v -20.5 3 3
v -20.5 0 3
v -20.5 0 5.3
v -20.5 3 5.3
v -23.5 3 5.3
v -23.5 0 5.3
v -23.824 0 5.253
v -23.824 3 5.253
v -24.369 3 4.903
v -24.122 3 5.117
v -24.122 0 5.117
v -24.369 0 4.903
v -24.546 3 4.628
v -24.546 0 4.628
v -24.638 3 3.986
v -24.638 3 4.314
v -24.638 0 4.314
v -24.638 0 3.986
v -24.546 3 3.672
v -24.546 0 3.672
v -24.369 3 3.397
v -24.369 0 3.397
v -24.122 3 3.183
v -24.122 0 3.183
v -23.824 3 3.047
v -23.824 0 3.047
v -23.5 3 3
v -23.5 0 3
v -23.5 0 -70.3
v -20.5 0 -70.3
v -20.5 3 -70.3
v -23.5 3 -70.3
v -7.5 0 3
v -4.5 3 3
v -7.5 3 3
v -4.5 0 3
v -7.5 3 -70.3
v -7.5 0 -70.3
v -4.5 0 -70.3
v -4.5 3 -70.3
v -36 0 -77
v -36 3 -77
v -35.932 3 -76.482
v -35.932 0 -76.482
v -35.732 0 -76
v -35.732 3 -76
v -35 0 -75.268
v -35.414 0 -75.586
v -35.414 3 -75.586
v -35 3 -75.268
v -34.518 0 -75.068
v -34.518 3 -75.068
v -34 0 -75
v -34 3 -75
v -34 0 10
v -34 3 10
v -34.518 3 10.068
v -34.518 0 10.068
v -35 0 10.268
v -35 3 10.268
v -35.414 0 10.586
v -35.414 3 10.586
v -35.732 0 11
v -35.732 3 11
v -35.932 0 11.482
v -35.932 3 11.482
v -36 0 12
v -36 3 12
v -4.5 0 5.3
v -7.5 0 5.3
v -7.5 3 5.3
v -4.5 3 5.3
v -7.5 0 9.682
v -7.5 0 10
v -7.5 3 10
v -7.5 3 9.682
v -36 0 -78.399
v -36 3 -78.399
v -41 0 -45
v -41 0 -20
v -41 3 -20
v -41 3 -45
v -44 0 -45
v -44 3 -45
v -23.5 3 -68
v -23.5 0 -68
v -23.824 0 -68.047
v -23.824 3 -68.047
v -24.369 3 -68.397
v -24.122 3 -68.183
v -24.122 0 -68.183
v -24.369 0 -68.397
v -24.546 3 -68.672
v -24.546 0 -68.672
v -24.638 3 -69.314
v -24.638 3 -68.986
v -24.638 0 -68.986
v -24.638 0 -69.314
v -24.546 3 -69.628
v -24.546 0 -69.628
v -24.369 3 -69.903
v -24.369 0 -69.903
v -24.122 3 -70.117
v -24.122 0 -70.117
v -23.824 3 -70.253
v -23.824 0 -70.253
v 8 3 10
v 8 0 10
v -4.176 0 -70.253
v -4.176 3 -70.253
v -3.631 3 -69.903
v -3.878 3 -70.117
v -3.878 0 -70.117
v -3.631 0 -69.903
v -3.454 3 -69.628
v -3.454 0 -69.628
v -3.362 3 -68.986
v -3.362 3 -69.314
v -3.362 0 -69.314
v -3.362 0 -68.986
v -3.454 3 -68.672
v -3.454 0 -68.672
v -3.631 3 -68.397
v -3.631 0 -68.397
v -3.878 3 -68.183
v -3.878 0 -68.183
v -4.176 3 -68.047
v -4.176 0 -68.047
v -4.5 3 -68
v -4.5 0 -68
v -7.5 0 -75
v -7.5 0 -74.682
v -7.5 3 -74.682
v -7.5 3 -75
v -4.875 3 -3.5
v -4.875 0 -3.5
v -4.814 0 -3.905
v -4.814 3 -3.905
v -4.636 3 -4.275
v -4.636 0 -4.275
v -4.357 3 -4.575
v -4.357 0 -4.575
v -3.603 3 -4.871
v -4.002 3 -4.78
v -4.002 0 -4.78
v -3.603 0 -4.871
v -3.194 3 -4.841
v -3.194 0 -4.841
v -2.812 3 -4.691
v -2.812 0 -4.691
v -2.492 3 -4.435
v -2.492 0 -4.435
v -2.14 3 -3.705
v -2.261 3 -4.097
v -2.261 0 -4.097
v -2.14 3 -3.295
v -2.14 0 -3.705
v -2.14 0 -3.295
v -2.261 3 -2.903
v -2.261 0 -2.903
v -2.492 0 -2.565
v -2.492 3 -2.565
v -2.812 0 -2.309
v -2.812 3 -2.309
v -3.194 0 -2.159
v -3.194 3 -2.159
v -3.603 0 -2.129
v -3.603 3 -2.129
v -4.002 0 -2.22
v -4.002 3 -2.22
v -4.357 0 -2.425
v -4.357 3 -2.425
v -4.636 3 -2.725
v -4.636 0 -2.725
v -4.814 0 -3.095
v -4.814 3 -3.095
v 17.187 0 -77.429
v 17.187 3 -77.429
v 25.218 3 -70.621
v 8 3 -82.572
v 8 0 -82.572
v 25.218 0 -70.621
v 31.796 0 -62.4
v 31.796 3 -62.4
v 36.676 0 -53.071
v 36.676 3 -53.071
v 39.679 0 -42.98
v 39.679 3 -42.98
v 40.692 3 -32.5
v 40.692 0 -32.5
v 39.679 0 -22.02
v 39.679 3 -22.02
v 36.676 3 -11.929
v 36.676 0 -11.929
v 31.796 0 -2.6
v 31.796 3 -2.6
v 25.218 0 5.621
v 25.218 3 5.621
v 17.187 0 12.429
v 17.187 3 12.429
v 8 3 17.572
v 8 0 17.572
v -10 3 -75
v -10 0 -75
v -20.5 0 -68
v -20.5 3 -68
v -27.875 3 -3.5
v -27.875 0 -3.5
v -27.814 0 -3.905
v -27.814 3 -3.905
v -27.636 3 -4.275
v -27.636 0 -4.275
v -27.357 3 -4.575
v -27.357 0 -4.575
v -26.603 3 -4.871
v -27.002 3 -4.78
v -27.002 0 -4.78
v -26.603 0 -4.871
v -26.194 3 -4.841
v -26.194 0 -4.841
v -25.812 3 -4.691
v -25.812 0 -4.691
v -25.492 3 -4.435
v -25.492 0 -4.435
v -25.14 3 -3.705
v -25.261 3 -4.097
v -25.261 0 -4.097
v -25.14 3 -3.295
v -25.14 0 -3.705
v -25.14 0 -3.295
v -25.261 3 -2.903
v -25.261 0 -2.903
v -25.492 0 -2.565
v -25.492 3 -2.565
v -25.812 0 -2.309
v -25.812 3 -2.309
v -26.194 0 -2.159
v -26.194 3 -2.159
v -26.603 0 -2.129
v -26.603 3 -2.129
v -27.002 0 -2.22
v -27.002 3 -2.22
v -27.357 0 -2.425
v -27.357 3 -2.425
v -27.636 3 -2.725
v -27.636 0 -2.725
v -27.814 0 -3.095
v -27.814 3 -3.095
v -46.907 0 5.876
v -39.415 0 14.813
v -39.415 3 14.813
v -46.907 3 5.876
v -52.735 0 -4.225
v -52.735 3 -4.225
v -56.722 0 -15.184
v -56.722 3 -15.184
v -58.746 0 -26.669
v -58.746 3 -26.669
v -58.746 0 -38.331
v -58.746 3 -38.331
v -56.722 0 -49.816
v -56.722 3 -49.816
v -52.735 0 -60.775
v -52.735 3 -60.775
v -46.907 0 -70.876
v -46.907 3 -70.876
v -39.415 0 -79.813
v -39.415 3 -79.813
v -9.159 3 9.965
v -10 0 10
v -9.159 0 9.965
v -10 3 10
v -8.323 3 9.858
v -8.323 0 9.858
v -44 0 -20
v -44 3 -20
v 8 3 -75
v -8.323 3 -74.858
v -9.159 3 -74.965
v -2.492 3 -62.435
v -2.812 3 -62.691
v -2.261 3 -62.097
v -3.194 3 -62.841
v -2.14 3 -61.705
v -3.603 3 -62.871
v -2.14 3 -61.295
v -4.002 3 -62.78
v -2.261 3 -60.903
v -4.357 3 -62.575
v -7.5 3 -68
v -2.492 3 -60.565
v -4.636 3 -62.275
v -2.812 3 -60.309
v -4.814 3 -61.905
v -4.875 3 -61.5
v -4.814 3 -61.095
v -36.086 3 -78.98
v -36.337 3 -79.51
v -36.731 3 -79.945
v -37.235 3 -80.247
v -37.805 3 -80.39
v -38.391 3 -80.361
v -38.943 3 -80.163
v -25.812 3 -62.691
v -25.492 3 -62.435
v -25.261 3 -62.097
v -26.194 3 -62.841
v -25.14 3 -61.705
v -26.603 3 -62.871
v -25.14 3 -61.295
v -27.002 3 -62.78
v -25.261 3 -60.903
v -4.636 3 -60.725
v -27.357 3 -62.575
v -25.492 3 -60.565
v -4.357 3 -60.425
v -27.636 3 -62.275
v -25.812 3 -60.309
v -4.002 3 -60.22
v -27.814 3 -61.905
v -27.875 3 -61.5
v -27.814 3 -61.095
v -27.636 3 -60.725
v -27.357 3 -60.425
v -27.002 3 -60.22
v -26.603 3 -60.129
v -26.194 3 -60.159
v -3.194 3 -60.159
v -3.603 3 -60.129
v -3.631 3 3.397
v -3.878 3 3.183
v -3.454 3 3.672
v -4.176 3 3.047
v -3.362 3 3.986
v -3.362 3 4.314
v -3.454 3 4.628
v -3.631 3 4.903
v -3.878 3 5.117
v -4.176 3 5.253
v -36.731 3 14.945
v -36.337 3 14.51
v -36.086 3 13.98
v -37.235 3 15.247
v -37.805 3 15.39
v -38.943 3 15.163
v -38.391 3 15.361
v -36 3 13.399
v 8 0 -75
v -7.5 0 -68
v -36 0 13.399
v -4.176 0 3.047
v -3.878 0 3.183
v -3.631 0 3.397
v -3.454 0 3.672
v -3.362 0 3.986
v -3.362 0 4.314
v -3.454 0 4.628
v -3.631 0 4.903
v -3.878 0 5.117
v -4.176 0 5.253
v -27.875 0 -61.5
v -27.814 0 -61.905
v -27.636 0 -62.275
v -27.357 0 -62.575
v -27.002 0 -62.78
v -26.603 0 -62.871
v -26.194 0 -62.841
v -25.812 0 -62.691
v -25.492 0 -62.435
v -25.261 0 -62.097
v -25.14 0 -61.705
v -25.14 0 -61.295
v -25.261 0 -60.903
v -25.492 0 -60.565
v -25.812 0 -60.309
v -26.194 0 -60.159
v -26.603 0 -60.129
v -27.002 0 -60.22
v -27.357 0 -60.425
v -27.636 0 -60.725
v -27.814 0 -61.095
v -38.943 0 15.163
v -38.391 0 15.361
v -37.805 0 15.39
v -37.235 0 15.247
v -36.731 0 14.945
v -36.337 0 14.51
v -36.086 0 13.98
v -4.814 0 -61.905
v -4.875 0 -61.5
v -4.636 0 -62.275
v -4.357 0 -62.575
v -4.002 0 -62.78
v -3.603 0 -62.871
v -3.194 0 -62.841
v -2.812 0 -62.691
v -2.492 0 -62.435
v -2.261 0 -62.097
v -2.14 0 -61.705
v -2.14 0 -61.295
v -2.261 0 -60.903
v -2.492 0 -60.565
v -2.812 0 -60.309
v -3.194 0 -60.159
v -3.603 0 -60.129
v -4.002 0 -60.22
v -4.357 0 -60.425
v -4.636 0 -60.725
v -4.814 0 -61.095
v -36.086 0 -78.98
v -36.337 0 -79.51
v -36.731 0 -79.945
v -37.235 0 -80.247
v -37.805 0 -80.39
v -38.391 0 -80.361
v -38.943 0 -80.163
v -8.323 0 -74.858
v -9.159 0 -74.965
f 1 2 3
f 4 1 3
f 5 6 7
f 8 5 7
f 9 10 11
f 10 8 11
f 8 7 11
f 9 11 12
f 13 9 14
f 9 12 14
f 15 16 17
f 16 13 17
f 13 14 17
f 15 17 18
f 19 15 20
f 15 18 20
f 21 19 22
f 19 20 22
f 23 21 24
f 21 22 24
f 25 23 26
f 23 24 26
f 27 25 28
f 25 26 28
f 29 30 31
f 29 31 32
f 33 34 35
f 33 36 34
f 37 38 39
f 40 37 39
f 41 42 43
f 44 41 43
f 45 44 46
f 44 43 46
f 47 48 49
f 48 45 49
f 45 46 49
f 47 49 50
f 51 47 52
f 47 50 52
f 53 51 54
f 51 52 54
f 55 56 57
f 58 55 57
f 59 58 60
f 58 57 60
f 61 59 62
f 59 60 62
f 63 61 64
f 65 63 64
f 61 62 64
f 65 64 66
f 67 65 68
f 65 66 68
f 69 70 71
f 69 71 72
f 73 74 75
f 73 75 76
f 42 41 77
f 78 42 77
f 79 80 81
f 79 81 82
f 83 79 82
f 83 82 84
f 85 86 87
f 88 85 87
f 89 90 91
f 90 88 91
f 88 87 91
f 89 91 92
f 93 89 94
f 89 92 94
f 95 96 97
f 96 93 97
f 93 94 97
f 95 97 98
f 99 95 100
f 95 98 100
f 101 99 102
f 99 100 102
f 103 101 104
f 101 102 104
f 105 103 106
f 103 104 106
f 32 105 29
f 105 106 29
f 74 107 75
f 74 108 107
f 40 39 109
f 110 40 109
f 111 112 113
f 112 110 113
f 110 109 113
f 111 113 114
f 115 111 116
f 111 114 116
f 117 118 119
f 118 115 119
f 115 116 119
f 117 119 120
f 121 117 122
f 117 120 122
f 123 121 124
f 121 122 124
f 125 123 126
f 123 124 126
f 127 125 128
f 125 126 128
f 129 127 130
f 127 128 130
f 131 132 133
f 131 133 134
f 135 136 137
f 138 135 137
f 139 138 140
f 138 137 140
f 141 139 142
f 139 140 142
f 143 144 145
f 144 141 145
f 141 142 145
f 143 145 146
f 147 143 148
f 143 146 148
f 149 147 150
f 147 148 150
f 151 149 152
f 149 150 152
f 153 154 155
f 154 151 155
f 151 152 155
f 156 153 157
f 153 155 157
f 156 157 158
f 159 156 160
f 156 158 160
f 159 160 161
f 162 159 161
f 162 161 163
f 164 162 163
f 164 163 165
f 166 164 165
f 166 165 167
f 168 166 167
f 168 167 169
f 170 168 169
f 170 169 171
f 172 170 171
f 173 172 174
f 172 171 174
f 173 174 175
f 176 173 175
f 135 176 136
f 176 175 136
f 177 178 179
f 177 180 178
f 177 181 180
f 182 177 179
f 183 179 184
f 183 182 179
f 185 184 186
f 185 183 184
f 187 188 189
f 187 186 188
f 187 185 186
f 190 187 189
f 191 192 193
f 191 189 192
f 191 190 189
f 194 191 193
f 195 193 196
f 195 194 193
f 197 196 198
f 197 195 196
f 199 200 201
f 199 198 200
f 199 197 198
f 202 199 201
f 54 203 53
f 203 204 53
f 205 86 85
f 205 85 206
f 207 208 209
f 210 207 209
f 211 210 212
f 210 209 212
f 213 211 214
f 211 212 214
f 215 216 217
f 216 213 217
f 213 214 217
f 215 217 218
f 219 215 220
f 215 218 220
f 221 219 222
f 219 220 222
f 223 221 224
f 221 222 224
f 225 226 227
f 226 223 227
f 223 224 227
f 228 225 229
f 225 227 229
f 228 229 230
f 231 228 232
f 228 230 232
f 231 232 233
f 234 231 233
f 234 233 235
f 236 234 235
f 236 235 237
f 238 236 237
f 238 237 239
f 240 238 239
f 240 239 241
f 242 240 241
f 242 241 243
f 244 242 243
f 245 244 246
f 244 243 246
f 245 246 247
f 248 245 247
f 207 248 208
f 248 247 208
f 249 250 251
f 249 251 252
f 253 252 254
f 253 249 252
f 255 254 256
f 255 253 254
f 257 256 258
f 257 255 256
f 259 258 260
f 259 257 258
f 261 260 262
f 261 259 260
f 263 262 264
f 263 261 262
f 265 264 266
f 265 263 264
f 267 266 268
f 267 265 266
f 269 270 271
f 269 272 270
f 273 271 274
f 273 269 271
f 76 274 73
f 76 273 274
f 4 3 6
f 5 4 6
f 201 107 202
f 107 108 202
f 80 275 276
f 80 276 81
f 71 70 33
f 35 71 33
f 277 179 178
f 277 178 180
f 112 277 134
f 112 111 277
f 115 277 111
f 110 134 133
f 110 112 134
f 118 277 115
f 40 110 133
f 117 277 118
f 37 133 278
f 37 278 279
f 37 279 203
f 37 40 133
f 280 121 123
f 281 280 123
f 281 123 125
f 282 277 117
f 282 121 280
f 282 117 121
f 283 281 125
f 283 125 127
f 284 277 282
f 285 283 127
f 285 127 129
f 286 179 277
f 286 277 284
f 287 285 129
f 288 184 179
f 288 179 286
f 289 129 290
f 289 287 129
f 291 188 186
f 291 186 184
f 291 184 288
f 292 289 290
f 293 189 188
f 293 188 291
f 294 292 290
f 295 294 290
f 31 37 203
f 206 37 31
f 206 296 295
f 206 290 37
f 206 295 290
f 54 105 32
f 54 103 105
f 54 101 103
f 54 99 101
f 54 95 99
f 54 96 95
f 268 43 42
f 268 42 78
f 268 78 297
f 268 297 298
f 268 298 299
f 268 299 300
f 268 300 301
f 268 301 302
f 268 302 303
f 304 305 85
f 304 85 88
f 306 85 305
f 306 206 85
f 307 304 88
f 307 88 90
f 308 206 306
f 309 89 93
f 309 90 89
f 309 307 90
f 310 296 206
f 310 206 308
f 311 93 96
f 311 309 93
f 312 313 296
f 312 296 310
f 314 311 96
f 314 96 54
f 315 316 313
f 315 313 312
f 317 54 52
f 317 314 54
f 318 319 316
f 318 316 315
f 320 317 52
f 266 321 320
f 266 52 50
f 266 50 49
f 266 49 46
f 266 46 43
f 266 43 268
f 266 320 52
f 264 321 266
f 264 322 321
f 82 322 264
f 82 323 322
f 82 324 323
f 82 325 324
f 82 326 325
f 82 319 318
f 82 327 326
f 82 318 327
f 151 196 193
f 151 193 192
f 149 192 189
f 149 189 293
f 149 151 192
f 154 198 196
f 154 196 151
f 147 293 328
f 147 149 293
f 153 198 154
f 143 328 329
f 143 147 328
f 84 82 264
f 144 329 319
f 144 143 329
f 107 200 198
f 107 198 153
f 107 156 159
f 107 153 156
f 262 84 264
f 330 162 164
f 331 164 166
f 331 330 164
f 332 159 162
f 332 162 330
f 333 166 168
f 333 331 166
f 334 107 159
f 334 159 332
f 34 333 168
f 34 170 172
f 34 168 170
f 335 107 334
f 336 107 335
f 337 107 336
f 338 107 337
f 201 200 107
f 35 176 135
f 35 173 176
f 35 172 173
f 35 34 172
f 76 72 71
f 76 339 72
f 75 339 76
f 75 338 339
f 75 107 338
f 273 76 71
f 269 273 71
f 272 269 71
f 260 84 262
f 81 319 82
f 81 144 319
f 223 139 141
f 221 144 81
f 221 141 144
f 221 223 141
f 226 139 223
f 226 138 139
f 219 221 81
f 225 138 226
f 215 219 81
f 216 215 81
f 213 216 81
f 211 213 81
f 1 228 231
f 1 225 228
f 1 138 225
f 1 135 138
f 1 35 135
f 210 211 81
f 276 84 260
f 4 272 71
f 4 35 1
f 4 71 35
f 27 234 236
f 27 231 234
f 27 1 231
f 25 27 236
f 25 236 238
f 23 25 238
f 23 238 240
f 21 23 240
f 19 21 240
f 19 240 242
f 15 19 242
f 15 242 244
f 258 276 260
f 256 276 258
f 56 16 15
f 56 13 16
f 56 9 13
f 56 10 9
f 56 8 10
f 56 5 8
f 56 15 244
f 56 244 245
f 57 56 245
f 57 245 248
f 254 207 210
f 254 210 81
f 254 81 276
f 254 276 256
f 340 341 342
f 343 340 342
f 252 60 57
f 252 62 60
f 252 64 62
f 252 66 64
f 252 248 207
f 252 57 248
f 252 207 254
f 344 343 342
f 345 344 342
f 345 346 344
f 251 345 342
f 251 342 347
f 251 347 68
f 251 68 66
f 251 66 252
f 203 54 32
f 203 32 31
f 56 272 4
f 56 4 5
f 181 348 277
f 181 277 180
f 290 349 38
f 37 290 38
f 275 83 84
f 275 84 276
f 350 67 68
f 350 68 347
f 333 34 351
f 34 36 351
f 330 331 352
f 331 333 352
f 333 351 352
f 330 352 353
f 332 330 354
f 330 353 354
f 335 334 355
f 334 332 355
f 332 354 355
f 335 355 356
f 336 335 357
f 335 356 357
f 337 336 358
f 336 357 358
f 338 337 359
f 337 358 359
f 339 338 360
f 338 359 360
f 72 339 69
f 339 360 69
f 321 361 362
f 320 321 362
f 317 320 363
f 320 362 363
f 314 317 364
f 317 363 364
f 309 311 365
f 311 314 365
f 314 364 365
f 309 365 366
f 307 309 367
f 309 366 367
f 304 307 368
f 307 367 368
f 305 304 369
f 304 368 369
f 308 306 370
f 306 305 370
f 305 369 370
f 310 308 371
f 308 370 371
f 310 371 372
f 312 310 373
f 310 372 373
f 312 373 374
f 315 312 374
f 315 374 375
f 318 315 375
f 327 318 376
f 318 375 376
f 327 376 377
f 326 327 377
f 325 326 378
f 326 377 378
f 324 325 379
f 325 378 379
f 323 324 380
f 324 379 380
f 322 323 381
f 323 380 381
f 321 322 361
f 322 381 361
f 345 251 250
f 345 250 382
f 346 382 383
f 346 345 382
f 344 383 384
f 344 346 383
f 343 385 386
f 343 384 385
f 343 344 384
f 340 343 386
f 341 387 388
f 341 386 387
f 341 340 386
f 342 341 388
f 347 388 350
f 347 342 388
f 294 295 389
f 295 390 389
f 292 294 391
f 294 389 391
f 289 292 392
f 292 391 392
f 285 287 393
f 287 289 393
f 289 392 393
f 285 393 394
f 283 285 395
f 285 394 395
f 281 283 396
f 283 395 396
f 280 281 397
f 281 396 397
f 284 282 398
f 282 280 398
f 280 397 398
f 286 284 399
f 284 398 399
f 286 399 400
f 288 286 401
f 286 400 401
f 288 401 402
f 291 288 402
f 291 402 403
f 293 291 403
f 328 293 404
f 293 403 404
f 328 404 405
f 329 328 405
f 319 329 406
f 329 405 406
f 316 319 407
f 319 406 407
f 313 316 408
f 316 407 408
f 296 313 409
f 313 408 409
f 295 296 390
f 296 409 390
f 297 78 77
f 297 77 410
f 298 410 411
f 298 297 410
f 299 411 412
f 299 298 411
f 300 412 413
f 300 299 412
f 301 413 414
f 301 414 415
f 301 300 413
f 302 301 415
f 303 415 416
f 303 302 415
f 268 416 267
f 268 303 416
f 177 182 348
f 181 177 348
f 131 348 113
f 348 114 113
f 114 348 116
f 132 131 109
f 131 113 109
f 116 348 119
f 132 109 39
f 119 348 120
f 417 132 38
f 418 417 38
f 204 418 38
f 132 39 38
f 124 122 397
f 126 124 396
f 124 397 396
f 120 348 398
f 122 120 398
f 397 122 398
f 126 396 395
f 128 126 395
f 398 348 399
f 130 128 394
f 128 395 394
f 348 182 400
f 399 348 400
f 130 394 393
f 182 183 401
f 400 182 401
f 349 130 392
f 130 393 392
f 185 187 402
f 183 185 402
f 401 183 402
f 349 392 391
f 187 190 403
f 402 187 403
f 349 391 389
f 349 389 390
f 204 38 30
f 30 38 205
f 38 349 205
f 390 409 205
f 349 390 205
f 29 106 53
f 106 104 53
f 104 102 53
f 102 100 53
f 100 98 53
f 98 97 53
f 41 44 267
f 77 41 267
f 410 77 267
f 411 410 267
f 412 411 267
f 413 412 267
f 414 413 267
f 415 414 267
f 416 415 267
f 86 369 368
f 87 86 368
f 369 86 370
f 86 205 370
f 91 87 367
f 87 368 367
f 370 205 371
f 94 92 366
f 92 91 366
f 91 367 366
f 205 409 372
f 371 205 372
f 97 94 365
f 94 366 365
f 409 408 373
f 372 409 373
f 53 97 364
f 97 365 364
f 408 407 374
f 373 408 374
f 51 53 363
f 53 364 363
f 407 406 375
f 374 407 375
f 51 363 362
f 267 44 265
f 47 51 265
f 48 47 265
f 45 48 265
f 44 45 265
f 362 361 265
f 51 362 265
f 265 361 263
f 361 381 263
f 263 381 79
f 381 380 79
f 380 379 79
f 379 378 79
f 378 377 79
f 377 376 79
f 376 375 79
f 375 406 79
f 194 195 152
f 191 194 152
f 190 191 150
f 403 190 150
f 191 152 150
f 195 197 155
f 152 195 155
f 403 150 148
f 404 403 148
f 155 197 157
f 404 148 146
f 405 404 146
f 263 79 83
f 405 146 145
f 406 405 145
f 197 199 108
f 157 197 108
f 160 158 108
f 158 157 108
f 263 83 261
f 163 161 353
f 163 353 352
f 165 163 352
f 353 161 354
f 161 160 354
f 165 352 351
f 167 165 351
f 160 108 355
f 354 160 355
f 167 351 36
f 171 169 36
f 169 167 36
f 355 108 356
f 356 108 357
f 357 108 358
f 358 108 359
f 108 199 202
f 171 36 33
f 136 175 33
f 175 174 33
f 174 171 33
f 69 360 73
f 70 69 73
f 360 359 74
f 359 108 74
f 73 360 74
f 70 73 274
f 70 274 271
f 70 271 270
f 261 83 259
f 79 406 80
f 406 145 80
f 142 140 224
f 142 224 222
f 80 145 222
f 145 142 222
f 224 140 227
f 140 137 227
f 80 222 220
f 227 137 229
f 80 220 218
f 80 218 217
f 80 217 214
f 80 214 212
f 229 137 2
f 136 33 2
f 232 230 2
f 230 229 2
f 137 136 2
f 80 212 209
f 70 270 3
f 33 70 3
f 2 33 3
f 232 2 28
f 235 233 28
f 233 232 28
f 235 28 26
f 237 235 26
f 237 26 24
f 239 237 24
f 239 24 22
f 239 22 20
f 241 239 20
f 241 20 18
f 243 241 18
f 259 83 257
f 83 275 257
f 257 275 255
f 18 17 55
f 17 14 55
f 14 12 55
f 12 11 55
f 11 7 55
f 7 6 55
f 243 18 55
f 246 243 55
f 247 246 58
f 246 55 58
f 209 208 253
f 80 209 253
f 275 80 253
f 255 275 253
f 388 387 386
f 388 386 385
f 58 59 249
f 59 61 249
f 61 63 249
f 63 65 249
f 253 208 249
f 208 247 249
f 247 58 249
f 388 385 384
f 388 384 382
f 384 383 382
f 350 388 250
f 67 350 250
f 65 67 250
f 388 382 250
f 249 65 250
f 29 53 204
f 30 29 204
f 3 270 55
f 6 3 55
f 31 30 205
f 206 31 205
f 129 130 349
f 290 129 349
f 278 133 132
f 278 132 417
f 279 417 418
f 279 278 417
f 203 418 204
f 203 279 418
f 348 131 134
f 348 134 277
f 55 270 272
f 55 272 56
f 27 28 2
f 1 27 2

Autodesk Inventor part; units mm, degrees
ref_plane "YZ Plane" through (0, 0, 0) normal (1, 0, 0) x (0, 1, 0)
ref_plane "XZ Plane" through (0, 0, 0) normal (0, 1, 0) x (-1, 0, 0)
ref_plane "XY Plane" through (0, 0, 0) normal (0, 0, 1) x (1, 0, 0)
sketch "Boceto1" plane through (0, 0, 0) normal (0, 1, 0) x (-1, 0, 0)
  line L0 (3, 0) -> (33, 0)
  line L1 (36, -3) -> (36, -62)
  line L2 (33, -65) -> (3, -65)
  line L3 (0, -62) -> (0, -3)
  circle A0 centre (3.5, -61.5) radius 1.375
  arc A1 (36, -3) -> (33, 0) centre (33, -3) ccw
  arc A2 (3, 0) -> (0, -3) centre (3, -3) ccw
  arc A3 (0, -62) -> (3, -65) centre (3, -62) ccw
  arc A4 (33, -65) -> (36, -62) centre (33, -62) ccw
  circle A5 centre (26.5, -61.5) radius 1.375
  circle A6 centre (3.5, -3.5) radius 1.375
  circle A7 centre (26.5, -3.5) radius 1.375
  line L4 (36, 0) -> (0, 0)
  line L5 (0, 0) -> (0, 10)
  line L6 (0, 10) -> (36, 10)
  line L7 (36, 10) -> (36, 0)
  line L8 (36, -65) -> (0, -65)
  line L9 (0, -65) -> (0, -75)
  line L10 (0, -75) -> (36, -75)
  line L11 (36, -75) -> (36, -65)
  line L12 (7.5, 0) -> (20.5, 0)
  line L13 (20.5, 0) -> (20.5, 10)
  line L14 (20.5, 10) -> (7.5, 10)
  line L15 (7.5, 10) -> (7.5, 0)
  line L16 (7.5, 0) -> (20.5, 10) construction
  line L17 (20.5, 0) -> (7.5, 10) construction
  line L18 (7.5, -75) -> (20.5, -75)
  line L19 (20.5, -75) -> (20.5, -65)
  line L20 (20.5, -65) -> (7.5, -65)
  line L21 (7.5, -65) -> (7.5, -75)
  line L22 (7.5, -75) -> (20.5, -65) construction
  line L23 (20.5, -75) -> (7.5, -65) construction
  line L24 (36, -32.5) -> (0, -32.5)
  line L25 (36, 0) -> (36, -3)
  line L26 (0, 0) -> (0, -3)
  line L27 (0, -62) -> (0, -65)
  line L28 (36, -62) -> (36, -65)
  line L29 (36, -22.5) -> (49, -22.5)
  line L30 (49, -22.5) -> (49, -42.5)
  line L31 (49, -42.5) -> (36, -42.5)
  line L32 (36, -42.5) -> (36, -22.5)
  arc A8 (49, -42.5) -> (49, -22.5) centre (49, -32.5) ccw
  line L33 (20.5, 5.3) -> (23.5, 5.3)
  line L34 (23.5, 5.3) -> (23.5, 3)
  line L35 (23.5, 3) -> (20.5, 3)
  line L36 (20.5, 3) -> (20.5, 5.3)
  arc A9 (23.5, 3) -> (23.5, 5.3) centre (23.5, 4.15) ccw
  line L37 (14, 0) -> (14, -65)
  line L38 (7.5, 5.3) -> (4.5, 5.3)
  line L39 (4.5, 5.3) -> (4.5, 3)
  line L40 (4.5, 3) -> (7.5, 3)
  line L41 (7.5, 3) -> (7.5, 5.3)
  arc A10 (4.5, 5.3) -> (4.5, 3) centre (4.5, 4.15) ccw
  line L42 (20.5, -70.3) -> (23.5, -70.3)
  line L43 (23.5, -70.3) -> (23.5, -68)
  line L44 (23.5, -68) -> (20.5, -68)
  line L45 (20.5, -68) -> (20.5, -70.3)
  arc A11 (23.5, -70.3) -> (23.5, -68) centre (23.5, -69.15) ccw
  line L46 (4.5, -68) -> (7.5, -68)
  arc A12 (4.5, -68) -> (4.5, -70.3) centre (4.5, -69.15) ccw
  line L47 (7.5, -70.3) -> (4.5, -70.3)
  line L48 (4.5, -70.3) -> (4.5, -68)
  line L49 (7.5, -68) -> (7.5, -70.3)
  line L50 (36, 0) -> (49, 0)
  line L51 (49, 0) -> (49, -65)
  line L52 (49, -65) -> (36, -65)
  line L53 (36, -65) -> (36, 0)
  line L54 (44, -20) -> (41, -20)
  line L55 (41, -20) -> (41, -45)
  line L56 (41, -45) -> (44, -45)
  line L57 (44, -45) -> (44, -20)
  line L58 (36, 10) -> (36, 18)
  line L59 (36, -75) -> (36, -83)
  arc A13 (36, -83) -> (36, 18) centre (-7.9402, -32.5) ccw
  line L60 (0, -75) -> (-8, -75)
  line L61 (-8, -75) -> (-8, 10)
  line L62 (-8, 10) -> (0, 10)
  line L63 (0, 10) -> (0, -75)
  line L64 (-8, 10) -> (-8, 17.5724)
  line L65 (-8, -75) -> (-8, -82.5724)
  arc A14 (-8, 17.5724) -> (-8, -82.5724) centre (14, -32.5) ccw
  circle A15 centre (118.6884, -49.4222) radius 60
  point P0 (14, 5)
  point P1 (14, -70)
  point P2 (36, -42.5)
  point P3 (7.5, -70.3)
  point P4 (20.5, -70.3)
  point P5 (7.5, 5.3)
  point P6 (20.5, 3)
  point P7 (44, -32.5)
  point P8 (36, -65)
  point P9 (44, -42.5)
  point P10 (41, -42.5)
  point P11 (41, -22.5)
  point P12 (44, -22.5)
  point P13 (49, -22.5)
  point P14 (59, -32.5)
  dimension "d0" = 36
  dimension "d1" = 65
  dimension "d2" = 2.75
  dimension "d3" = 3
  dimension "d4" = 3
  dimension "d5" = 3
  dimension "d6" = 3
  dimension "d7" = 3.5
  dimension "d8" = 3.5
  dimension "d11" = 23
  dimension "d14" = 58
  dimension "d17" = 10
  dimension "d18" = 10
  dimension "d19" = 13
  dimension "d20" = 10
  dimension "d21" = 13
  dimension "d22" = 10
  dimension "d26" = 7.5
  dimension "d30" = 20
  dimension "d31" = 13
  dimension "d32" = 3
  dimension "d33" = 2.3
  dimension "d34" = 3
  dimension "d35" = 1.15
  dimension "d36" = 13
  dimension "d37" = 3
  dimension "d38" = 25
  dimension "d39" = 5
  dimension "d42" = 8
  dimension "d43" = 8
  dimension "d46" = 8
  dimension "d47" = 54.6923
  dimension "d50" = 120
extrude "Extrusión1" add sketch "Boceto1" along normal blind 3 contours L4 L5 L6 L15 L38 A10 L40 L0 | L0 L37 L24 L3 A2 | A2 L26 L4 | L15 L6 L13 L0 | L0 A1 L1 L24 L37 | L24 L37 L2 A3 L3 | L13 L35 A9 L33 L6 L7 L4 L0 | L24 L1 A4 L2 L37 | A3 L8 L27 | L4 L25 A1 | L1 L29 L55 L31 | L2 L19 L10 L21 | L2 L21 L46 A12 L47 L10 L9 L8 | L25 L50 L51 L29 L57 L54 L55 L1 | L7 L58 A13 A8 L51 L50 | L31 L55 L56 L57 L51 L52 L28 L1 | L2 L8 L11 L10 L19 L42 A11 L44 | L29 L57 L31 L55 | L28 L8 A4 | L30 L31 L57 L29 | A8 L30 | L52 L51 A8 A13 L59 L11
fillet "Empalme1" radius 10 2 edges at (0, 1.5, -75) (0, 1.5, 10)
extrude "Extrusión2" cut sketch "Boceto1" along normal blind 3 contours L29 L57 L31 L55
fillet "Empalme2" radius 2 4 edges at (-36, 1.5, -83) (-36, 1.5, 18) (-36, 1.5, 10) (-36, 1.5, -75)
extrude "Extrusión3" add sketch "Boceto1" along normal blind 3 contours L4 L5 L6 L15 L38 A10 L40 L0 | L3 L27 L9 L60 L61 L62 L5 L26 | L61 L65 A14 L64 | L2 L21 L46 A12 L47 L10 L9 L8
equation "\"d18\" = d17"
equation "\"d21\" = d19"
equation "\"d22\" = d20"
equation "\"d36\" = d31"
properties part number "Parte inferior 2"
